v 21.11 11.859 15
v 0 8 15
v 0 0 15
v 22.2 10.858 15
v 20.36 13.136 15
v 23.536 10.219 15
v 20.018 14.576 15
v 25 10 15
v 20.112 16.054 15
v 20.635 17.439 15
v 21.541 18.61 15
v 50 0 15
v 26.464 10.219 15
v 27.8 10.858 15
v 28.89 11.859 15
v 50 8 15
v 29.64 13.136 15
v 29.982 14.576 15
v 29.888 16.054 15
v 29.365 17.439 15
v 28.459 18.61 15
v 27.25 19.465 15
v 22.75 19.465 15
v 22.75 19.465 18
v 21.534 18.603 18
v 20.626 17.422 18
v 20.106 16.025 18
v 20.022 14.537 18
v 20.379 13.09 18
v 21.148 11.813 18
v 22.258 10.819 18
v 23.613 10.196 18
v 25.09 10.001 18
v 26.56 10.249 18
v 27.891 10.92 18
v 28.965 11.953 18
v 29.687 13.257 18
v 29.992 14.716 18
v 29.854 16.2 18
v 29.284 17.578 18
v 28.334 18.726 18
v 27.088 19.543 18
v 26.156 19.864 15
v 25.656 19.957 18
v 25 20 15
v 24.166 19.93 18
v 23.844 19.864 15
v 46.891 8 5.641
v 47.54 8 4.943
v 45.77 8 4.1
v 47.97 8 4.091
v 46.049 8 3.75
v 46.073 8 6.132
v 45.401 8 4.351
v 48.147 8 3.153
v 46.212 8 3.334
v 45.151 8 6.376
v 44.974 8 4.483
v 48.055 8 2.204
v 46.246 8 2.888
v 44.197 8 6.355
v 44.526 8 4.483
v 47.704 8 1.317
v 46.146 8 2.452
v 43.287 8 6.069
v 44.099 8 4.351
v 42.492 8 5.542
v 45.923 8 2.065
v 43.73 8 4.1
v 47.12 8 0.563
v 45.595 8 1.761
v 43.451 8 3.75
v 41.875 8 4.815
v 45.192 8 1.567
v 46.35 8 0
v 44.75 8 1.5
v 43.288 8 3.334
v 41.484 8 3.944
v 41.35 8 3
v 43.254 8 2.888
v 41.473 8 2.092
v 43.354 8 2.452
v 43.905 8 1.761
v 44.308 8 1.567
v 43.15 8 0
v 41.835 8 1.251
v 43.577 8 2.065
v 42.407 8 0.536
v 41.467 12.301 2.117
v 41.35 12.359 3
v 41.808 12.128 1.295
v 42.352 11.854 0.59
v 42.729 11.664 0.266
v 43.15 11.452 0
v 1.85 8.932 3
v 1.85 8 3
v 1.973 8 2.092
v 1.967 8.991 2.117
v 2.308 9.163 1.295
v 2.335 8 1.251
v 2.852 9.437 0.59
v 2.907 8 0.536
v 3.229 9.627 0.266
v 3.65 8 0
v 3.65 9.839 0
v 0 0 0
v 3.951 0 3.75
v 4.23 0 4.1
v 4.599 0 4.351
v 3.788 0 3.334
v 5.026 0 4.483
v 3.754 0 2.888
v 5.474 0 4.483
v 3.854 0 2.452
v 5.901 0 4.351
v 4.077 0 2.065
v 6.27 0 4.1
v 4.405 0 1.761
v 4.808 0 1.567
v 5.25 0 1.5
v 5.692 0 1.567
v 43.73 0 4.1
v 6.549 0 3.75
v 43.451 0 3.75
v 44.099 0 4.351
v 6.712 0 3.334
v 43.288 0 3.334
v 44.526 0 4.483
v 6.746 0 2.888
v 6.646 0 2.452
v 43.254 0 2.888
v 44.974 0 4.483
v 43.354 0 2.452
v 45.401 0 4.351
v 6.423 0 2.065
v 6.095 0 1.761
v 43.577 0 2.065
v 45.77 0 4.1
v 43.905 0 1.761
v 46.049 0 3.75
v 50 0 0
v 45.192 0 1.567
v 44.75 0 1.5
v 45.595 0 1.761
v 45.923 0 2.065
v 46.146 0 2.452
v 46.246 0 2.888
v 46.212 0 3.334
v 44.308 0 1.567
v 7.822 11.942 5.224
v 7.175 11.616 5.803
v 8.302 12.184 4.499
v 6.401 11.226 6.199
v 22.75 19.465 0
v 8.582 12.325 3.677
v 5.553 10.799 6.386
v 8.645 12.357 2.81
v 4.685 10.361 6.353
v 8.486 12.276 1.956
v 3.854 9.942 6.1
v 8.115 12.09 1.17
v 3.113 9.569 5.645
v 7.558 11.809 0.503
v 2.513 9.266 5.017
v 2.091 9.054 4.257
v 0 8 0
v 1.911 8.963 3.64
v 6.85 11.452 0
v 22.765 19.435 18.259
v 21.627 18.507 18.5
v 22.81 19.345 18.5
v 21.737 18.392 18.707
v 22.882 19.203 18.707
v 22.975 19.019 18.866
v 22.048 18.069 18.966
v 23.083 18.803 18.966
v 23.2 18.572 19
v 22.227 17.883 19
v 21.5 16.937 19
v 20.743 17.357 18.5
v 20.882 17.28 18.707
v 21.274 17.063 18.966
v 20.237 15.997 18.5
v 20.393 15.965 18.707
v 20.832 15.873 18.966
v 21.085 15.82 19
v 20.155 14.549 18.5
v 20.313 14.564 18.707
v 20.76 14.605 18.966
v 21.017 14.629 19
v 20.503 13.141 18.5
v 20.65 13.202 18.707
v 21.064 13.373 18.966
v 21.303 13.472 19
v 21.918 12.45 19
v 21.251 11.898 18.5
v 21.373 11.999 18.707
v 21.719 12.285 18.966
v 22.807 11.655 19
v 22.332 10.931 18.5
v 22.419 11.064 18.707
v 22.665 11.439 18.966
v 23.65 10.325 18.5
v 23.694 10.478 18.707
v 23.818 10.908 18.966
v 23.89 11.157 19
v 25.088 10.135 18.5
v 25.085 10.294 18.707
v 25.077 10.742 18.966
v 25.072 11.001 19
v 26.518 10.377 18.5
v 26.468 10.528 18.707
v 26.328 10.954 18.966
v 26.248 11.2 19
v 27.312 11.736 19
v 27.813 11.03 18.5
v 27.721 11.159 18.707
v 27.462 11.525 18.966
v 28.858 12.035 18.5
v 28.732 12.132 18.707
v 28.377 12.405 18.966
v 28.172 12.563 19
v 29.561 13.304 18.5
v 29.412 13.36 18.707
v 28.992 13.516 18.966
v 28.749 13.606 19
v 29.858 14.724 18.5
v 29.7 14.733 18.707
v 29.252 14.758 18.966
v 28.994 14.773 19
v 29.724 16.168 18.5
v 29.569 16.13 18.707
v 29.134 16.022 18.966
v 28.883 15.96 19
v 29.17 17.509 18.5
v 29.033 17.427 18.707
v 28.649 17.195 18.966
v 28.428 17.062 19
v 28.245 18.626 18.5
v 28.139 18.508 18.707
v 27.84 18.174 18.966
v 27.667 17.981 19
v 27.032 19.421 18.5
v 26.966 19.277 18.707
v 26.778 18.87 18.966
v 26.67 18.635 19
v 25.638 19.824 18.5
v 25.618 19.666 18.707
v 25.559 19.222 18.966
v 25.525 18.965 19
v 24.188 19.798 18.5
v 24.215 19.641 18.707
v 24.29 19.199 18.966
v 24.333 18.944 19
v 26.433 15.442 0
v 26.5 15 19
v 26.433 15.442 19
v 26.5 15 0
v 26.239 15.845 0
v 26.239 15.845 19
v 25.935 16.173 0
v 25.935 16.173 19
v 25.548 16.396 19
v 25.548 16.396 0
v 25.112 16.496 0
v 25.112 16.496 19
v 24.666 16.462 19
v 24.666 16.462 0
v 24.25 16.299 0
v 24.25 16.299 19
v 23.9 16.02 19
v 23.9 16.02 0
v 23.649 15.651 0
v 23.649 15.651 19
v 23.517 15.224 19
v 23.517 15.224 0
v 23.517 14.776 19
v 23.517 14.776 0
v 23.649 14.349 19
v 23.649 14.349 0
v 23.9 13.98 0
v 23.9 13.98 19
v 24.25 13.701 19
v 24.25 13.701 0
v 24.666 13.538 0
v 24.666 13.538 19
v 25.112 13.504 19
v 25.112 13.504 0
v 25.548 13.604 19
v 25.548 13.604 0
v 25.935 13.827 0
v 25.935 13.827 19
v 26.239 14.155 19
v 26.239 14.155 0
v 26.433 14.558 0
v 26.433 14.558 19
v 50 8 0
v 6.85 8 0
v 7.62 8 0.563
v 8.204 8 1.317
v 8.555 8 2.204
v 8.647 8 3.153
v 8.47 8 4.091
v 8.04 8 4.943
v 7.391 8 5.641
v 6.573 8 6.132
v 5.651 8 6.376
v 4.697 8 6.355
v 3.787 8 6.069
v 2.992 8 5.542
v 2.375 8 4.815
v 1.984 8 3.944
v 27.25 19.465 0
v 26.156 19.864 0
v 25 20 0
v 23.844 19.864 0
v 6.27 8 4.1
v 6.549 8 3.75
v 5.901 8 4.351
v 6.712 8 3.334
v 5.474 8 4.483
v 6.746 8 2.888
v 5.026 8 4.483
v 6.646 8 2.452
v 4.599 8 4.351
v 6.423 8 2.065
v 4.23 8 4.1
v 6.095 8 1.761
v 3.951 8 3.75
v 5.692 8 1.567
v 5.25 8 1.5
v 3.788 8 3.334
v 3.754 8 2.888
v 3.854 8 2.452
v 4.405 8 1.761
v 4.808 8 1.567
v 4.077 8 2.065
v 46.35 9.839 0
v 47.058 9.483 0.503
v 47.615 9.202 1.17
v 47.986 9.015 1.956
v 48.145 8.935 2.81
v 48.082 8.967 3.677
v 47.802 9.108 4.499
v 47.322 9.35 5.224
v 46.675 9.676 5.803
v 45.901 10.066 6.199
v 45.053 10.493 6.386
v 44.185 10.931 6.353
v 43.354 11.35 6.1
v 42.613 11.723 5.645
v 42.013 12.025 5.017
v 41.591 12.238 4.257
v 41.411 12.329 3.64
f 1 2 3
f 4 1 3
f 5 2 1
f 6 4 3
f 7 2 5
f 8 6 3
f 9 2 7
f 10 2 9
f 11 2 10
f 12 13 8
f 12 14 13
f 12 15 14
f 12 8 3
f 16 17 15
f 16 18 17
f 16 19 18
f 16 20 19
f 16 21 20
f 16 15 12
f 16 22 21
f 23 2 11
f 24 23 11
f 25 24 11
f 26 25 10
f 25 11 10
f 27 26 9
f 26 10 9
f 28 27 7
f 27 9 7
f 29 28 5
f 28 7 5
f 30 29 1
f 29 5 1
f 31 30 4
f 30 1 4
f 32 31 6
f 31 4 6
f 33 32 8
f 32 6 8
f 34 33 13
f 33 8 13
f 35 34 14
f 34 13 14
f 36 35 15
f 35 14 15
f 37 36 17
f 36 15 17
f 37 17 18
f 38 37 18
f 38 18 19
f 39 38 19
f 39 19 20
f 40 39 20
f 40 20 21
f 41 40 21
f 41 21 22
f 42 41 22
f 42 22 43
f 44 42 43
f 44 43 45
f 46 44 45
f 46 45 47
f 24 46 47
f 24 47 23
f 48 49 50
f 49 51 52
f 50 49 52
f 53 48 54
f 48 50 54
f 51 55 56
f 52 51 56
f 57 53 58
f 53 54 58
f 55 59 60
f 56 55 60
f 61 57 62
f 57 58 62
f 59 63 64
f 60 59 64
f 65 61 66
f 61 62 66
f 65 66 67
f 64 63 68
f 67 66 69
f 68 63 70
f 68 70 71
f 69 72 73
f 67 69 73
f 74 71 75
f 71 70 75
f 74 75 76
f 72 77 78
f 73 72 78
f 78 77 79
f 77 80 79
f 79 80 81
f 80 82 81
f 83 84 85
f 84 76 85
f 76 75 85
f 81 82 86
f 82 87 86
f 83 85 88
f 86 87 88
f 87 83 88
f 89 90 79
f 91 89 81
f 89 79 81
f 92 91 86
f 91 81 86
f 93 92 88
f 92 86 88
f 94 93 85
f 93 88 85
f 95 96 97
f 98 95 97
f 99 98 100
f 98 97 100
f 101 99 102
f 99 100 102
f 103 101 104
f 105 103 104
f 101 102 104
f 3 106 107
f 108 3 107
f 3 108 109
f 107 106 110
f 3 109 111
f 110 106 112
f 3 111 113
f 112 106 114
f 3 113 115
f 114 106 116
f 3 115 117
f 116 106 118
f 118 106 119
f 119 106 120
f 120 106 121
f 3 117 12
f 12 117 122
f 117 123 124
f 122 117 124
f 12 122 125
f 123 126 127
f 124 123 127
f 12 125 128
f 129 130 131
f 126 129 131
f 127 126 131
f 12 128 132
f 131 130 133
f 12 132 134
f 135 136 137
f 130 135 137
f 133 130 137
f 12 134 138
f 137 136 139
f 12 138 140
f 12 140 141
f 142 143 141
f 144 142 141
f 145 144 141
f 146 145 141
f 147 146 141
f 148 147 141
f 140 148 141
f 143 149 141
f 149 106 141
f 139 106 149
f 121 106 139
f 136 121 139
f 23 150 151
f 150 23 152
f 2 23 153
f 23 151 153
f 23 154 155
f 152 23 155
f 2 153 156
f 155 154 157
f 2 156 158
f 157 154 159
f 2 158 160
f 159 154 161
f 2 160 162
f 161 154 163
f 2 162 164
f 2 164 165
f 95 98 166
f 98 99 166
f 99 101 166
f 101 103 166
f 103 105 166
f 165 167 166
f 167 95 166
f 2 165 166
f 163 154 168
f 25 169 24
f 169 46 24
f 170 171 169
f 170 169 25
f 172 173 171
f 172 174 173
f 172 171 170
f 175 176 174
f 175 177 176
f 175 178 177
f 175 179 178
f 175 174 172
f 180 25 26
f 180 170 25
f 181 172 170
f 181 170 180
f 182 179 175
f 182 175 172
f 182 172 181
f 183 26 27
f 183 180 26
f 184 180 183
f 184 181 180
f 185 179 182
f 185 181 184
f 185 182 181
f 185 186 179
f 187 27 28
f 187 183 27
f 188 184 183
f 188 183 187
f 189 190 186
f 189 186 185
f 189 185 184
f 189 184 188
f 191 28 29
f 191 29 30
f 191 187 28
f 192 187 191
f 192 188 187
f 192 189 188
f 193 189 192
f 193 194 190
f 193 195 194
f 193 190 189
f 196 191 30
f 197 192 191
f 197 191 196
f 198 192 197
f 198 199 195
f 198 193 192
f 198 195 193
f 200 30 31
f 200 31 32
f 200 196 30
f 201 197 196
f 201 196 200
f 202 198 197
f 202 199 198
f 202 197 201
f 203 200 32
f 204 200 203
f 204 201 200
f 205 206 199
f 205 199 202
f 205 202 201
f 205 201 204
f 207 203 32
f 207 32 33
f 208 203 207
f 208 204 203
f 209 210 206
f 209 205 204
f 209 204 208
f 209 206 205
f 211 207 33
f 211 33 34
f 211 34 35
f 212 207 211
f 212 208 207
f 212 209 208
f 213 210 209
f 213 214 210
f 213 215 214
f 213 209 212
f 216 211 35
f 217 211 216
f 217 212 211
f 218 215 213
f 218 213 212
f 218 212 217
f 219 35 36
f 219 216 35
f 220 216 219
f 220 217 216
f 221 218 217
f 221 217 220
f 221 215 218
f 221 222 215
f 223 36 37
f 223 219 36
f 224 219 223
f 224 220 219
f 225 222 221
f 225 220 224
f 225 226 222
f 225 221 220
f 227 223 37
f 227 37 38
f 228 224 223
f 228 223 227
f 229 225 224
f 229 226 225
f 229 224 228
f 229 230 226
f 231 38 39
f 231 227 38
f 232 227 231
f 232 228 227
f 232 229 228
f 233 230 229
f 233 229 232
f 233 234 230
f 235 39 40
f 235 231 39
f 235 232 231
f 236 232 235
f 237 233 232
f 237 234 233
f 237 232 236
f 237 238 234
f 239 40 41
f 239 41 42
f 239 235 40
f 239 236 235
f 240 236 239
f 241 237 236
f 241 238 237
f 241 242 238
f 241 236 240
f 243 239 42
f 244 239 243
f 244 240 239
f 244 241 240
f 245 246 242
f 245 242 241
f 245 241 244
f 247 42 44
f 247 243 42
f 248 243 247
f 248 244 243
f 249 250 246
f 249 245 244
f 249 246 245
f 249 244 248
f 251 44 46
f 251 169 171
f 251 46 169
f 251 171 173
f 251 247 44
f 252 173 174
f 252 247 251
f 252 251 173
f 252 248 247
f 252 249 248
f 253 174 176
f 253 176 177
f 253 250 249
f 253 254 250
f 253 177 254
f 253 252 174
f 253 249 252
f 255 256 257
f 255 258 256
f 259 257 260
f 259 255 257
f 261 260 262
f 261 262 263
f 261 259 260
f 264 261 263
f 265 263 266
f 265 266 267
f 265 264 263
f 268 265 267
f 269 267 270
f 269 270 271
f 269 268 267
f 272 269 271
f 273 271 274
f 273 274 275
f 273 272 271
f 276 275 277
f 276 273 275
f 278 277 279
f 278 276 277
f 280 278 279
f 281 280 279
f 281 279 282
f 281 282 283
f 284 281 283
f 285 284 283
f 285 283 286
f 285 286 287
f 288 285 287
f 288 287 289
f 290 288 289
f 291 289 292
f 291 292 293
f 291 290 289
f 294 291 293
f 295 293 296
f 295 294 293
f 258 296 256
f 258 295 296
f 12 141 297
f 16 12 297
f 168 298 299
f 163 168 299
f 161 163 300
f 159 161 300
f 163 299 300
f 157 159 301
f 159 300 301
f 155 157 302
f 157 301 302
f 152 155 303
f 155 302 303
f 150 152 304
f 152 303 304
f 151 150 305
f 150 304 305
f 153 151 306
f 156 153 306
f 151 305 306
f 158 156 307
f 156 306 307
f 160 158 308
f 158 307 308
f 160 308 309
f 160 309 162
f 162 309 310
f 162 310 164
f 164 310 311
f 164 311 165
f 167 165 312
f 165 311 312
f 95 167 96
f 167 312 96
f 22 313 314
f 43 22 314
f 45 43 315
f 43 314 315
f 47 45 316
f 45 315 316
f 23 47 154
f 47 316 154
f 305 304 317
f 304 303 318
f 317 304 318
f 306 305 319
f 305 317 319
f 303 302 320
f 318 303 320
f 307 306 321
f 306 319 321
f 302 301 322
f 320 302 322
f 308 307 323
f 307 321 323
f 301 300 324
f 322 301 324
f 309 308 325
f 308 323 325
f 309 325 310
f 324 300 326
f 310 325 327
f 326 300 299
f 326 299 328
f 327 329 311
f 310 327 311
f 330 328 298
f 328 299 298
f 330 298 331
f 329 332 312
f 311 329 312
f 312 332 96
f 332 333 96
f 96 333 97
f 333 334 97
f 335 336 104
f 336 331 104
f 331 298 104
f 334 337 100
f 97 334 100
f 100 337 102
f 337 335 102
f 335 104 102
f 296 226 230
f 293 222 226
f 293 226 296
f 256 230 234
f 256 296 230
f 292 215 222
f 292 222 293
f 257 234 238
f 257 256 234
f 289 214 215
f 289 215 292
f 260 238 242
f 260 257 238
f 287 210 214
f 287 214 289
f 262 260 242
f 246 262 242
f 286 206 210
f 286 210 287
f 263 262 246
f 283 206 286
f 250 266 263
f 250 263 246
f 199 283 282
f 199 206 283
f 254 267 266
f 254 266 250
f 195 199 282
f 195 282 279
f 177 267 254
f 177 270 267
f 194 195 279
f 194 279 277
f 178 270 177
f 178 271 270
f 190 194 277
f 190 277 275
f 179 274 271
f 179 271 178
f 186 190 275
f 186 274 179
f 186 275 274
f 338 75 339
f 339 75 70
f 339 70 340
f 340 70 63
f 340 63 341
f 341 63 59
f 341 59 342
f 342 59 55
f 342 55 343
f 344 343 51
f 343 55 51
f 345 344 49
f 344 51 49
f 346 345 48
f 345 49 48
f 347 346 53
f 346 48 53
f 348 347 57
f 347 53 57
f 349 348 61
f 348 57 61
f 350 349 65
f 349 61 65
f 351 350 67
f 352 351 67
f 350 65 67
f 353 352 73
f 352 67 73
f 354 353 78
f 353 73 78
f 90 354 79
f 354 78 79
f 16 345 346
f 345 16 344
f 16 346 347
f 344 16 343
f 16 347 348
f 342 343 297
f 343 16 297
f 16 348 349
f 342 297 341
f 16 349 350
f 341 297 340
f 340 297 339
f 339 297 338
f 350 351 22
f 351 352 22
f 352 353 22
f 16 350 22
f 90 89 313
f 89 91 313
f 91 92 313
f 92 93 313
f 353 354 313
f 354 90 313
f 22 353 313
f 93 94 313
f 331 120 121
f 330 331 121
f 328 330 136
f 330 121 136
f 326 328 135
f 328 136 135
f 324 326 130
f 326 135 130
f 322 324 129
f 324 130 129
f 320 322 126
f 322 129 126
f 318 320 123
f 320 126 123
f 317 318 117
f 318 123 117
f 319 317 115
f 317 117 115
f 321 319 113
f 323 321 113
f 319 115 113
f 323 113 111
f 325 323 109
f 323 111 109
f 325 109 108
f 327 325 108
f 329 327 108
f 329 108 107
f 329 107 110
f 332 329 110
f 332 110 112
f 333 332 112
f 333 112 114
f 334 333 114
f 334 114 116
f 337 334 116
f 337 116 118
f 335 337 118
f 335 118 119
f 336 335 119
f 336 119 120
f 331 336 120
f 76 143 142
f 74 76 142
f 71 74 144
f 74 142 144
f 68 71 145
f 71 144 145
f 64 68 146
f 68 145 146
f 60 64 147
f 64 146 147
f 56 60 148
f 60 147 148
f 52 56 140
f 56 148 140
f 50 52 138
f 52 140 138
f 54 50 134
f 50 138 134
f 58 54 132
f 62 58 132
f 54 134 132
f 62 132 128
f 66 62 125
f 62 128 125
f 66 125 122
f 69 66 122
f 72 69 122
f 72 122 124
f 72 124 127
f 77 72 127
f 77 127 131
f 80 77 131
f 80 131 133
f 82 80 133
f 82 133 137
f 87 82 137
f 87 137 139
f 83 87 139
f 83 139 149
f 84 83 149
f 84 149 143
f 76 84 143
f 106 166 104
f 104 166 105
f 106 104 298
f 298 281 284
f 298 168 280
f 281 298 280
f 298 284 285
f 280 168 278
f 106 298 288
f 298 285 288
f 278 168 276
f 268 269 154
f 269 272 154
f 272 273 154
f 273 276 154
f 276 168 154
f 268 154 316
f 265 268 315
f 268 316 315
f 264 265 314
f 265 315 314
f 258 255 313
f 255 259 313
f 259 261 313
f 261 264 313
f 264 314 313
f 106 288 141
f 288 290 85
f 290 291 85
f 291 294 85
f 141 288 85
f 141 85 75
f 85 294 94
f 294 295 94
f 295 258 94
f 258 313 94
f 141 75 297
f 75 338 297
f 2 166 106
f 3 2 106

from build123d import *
from build123d.topology import SkipClean

# Parameters (mm, degrees)
SKETCH_1_R          = 1.5
EXTRUDE_1_DEPTH     = 15
SKETCH_2_R          = 5
SKETCH_2_R_2        = 1.5
EXTRUDE_2_DEPTH     = 4
FILLET_1_R          = 1
SKETCH_3_R          = 1.5
CUT_EXTRUDE_1_DEPTH = 19
SKETCH_4_R          = 3.4
CUT_EXTRUDE_3_DEPTH = 19


with BuildPart() as part:
    # 草图1 → 凸台-拉伸1 (new body)
    with BuildSketch(Plane.XY):
        with BuildLine():
            Line((0, 0), (50, 0))
            Line((50, 0), (50, 8))
            Line((50, 8), (27.250210303, 19.465036796))
            ThreePointArc((27.250210303, 19.465036796), (25, 20), (22.749789697, 19.465036796))
            Line((22.749789697, 19.465036796), (0, 8))
            Line((0, 8), (0, 0))
        make_face()
        with Locations((25, 15)):
            Circle(SKETCH_1_R, mode=Mode.SUBTRACT)
    extrude(amount=EXTRUDE_1_DEPTH)

    # 草图2 → 凸台-拉伸2 (add)
    with BuildSketch(Plane.XY.offset(15)):
        with Locations(Location((25, 15, 0), (0, 0, 116.746382546))):
            Circle(SKETCH_2_R)
        with Locations((25, 15)):
            Circle(SKETCH_2_R_2, mode=Mode.SUBTRACT)
    extrude(amount=EXTRUDE_2_DEPTH)

    # 圆角1
    fillet_1_edges = [part.edges().sort_by_distance(p)[0] for p in [
        (27.250210303, 10.534963204, 19),
    ]]
    fillet(fillet_1_edges, radius=FILLET_1_R)

    # 草图3 → 切除-拉伸1 (cut)
    with SkipClean():  # the faces are left unmerged after this step: merging them gives an invalid solid
        with BuildSketch(Plane.XZ):
            with Locations(Location((5.25, 3, 0), (0, 0, 270))):
                Circle(SKETCH_3_R)
            with Locations(Location((44.75, 3, 0), (0, 0, 270))):
                Circle(SKETCH_3_R)
        extrude(amount=-CUT_EXTRUDE_1_DEPTH, mode=Mode.SUBTRACT)

    # 草图4 → 切除-拉伸3 (cut)
    with SkipClean():  # the faces are left unmerged after this step: merging them gives an invalid solid
        with BuildSketch(Plane(origin=(0, 8, 0), x_dir=(-1, 0, 0), z_dir=(0, -1, 0))):
            with Locations((-44.75, -3)):
                Circle(SKETCH_4_R)
            with Locations((-5.25, -3)):
                Circle(SKETCH_4_R)
        extrude(amount=-CUT_EXTRUDE_3_DEPTH, mode=Mode.SUBTRACT)


solid = part.part
